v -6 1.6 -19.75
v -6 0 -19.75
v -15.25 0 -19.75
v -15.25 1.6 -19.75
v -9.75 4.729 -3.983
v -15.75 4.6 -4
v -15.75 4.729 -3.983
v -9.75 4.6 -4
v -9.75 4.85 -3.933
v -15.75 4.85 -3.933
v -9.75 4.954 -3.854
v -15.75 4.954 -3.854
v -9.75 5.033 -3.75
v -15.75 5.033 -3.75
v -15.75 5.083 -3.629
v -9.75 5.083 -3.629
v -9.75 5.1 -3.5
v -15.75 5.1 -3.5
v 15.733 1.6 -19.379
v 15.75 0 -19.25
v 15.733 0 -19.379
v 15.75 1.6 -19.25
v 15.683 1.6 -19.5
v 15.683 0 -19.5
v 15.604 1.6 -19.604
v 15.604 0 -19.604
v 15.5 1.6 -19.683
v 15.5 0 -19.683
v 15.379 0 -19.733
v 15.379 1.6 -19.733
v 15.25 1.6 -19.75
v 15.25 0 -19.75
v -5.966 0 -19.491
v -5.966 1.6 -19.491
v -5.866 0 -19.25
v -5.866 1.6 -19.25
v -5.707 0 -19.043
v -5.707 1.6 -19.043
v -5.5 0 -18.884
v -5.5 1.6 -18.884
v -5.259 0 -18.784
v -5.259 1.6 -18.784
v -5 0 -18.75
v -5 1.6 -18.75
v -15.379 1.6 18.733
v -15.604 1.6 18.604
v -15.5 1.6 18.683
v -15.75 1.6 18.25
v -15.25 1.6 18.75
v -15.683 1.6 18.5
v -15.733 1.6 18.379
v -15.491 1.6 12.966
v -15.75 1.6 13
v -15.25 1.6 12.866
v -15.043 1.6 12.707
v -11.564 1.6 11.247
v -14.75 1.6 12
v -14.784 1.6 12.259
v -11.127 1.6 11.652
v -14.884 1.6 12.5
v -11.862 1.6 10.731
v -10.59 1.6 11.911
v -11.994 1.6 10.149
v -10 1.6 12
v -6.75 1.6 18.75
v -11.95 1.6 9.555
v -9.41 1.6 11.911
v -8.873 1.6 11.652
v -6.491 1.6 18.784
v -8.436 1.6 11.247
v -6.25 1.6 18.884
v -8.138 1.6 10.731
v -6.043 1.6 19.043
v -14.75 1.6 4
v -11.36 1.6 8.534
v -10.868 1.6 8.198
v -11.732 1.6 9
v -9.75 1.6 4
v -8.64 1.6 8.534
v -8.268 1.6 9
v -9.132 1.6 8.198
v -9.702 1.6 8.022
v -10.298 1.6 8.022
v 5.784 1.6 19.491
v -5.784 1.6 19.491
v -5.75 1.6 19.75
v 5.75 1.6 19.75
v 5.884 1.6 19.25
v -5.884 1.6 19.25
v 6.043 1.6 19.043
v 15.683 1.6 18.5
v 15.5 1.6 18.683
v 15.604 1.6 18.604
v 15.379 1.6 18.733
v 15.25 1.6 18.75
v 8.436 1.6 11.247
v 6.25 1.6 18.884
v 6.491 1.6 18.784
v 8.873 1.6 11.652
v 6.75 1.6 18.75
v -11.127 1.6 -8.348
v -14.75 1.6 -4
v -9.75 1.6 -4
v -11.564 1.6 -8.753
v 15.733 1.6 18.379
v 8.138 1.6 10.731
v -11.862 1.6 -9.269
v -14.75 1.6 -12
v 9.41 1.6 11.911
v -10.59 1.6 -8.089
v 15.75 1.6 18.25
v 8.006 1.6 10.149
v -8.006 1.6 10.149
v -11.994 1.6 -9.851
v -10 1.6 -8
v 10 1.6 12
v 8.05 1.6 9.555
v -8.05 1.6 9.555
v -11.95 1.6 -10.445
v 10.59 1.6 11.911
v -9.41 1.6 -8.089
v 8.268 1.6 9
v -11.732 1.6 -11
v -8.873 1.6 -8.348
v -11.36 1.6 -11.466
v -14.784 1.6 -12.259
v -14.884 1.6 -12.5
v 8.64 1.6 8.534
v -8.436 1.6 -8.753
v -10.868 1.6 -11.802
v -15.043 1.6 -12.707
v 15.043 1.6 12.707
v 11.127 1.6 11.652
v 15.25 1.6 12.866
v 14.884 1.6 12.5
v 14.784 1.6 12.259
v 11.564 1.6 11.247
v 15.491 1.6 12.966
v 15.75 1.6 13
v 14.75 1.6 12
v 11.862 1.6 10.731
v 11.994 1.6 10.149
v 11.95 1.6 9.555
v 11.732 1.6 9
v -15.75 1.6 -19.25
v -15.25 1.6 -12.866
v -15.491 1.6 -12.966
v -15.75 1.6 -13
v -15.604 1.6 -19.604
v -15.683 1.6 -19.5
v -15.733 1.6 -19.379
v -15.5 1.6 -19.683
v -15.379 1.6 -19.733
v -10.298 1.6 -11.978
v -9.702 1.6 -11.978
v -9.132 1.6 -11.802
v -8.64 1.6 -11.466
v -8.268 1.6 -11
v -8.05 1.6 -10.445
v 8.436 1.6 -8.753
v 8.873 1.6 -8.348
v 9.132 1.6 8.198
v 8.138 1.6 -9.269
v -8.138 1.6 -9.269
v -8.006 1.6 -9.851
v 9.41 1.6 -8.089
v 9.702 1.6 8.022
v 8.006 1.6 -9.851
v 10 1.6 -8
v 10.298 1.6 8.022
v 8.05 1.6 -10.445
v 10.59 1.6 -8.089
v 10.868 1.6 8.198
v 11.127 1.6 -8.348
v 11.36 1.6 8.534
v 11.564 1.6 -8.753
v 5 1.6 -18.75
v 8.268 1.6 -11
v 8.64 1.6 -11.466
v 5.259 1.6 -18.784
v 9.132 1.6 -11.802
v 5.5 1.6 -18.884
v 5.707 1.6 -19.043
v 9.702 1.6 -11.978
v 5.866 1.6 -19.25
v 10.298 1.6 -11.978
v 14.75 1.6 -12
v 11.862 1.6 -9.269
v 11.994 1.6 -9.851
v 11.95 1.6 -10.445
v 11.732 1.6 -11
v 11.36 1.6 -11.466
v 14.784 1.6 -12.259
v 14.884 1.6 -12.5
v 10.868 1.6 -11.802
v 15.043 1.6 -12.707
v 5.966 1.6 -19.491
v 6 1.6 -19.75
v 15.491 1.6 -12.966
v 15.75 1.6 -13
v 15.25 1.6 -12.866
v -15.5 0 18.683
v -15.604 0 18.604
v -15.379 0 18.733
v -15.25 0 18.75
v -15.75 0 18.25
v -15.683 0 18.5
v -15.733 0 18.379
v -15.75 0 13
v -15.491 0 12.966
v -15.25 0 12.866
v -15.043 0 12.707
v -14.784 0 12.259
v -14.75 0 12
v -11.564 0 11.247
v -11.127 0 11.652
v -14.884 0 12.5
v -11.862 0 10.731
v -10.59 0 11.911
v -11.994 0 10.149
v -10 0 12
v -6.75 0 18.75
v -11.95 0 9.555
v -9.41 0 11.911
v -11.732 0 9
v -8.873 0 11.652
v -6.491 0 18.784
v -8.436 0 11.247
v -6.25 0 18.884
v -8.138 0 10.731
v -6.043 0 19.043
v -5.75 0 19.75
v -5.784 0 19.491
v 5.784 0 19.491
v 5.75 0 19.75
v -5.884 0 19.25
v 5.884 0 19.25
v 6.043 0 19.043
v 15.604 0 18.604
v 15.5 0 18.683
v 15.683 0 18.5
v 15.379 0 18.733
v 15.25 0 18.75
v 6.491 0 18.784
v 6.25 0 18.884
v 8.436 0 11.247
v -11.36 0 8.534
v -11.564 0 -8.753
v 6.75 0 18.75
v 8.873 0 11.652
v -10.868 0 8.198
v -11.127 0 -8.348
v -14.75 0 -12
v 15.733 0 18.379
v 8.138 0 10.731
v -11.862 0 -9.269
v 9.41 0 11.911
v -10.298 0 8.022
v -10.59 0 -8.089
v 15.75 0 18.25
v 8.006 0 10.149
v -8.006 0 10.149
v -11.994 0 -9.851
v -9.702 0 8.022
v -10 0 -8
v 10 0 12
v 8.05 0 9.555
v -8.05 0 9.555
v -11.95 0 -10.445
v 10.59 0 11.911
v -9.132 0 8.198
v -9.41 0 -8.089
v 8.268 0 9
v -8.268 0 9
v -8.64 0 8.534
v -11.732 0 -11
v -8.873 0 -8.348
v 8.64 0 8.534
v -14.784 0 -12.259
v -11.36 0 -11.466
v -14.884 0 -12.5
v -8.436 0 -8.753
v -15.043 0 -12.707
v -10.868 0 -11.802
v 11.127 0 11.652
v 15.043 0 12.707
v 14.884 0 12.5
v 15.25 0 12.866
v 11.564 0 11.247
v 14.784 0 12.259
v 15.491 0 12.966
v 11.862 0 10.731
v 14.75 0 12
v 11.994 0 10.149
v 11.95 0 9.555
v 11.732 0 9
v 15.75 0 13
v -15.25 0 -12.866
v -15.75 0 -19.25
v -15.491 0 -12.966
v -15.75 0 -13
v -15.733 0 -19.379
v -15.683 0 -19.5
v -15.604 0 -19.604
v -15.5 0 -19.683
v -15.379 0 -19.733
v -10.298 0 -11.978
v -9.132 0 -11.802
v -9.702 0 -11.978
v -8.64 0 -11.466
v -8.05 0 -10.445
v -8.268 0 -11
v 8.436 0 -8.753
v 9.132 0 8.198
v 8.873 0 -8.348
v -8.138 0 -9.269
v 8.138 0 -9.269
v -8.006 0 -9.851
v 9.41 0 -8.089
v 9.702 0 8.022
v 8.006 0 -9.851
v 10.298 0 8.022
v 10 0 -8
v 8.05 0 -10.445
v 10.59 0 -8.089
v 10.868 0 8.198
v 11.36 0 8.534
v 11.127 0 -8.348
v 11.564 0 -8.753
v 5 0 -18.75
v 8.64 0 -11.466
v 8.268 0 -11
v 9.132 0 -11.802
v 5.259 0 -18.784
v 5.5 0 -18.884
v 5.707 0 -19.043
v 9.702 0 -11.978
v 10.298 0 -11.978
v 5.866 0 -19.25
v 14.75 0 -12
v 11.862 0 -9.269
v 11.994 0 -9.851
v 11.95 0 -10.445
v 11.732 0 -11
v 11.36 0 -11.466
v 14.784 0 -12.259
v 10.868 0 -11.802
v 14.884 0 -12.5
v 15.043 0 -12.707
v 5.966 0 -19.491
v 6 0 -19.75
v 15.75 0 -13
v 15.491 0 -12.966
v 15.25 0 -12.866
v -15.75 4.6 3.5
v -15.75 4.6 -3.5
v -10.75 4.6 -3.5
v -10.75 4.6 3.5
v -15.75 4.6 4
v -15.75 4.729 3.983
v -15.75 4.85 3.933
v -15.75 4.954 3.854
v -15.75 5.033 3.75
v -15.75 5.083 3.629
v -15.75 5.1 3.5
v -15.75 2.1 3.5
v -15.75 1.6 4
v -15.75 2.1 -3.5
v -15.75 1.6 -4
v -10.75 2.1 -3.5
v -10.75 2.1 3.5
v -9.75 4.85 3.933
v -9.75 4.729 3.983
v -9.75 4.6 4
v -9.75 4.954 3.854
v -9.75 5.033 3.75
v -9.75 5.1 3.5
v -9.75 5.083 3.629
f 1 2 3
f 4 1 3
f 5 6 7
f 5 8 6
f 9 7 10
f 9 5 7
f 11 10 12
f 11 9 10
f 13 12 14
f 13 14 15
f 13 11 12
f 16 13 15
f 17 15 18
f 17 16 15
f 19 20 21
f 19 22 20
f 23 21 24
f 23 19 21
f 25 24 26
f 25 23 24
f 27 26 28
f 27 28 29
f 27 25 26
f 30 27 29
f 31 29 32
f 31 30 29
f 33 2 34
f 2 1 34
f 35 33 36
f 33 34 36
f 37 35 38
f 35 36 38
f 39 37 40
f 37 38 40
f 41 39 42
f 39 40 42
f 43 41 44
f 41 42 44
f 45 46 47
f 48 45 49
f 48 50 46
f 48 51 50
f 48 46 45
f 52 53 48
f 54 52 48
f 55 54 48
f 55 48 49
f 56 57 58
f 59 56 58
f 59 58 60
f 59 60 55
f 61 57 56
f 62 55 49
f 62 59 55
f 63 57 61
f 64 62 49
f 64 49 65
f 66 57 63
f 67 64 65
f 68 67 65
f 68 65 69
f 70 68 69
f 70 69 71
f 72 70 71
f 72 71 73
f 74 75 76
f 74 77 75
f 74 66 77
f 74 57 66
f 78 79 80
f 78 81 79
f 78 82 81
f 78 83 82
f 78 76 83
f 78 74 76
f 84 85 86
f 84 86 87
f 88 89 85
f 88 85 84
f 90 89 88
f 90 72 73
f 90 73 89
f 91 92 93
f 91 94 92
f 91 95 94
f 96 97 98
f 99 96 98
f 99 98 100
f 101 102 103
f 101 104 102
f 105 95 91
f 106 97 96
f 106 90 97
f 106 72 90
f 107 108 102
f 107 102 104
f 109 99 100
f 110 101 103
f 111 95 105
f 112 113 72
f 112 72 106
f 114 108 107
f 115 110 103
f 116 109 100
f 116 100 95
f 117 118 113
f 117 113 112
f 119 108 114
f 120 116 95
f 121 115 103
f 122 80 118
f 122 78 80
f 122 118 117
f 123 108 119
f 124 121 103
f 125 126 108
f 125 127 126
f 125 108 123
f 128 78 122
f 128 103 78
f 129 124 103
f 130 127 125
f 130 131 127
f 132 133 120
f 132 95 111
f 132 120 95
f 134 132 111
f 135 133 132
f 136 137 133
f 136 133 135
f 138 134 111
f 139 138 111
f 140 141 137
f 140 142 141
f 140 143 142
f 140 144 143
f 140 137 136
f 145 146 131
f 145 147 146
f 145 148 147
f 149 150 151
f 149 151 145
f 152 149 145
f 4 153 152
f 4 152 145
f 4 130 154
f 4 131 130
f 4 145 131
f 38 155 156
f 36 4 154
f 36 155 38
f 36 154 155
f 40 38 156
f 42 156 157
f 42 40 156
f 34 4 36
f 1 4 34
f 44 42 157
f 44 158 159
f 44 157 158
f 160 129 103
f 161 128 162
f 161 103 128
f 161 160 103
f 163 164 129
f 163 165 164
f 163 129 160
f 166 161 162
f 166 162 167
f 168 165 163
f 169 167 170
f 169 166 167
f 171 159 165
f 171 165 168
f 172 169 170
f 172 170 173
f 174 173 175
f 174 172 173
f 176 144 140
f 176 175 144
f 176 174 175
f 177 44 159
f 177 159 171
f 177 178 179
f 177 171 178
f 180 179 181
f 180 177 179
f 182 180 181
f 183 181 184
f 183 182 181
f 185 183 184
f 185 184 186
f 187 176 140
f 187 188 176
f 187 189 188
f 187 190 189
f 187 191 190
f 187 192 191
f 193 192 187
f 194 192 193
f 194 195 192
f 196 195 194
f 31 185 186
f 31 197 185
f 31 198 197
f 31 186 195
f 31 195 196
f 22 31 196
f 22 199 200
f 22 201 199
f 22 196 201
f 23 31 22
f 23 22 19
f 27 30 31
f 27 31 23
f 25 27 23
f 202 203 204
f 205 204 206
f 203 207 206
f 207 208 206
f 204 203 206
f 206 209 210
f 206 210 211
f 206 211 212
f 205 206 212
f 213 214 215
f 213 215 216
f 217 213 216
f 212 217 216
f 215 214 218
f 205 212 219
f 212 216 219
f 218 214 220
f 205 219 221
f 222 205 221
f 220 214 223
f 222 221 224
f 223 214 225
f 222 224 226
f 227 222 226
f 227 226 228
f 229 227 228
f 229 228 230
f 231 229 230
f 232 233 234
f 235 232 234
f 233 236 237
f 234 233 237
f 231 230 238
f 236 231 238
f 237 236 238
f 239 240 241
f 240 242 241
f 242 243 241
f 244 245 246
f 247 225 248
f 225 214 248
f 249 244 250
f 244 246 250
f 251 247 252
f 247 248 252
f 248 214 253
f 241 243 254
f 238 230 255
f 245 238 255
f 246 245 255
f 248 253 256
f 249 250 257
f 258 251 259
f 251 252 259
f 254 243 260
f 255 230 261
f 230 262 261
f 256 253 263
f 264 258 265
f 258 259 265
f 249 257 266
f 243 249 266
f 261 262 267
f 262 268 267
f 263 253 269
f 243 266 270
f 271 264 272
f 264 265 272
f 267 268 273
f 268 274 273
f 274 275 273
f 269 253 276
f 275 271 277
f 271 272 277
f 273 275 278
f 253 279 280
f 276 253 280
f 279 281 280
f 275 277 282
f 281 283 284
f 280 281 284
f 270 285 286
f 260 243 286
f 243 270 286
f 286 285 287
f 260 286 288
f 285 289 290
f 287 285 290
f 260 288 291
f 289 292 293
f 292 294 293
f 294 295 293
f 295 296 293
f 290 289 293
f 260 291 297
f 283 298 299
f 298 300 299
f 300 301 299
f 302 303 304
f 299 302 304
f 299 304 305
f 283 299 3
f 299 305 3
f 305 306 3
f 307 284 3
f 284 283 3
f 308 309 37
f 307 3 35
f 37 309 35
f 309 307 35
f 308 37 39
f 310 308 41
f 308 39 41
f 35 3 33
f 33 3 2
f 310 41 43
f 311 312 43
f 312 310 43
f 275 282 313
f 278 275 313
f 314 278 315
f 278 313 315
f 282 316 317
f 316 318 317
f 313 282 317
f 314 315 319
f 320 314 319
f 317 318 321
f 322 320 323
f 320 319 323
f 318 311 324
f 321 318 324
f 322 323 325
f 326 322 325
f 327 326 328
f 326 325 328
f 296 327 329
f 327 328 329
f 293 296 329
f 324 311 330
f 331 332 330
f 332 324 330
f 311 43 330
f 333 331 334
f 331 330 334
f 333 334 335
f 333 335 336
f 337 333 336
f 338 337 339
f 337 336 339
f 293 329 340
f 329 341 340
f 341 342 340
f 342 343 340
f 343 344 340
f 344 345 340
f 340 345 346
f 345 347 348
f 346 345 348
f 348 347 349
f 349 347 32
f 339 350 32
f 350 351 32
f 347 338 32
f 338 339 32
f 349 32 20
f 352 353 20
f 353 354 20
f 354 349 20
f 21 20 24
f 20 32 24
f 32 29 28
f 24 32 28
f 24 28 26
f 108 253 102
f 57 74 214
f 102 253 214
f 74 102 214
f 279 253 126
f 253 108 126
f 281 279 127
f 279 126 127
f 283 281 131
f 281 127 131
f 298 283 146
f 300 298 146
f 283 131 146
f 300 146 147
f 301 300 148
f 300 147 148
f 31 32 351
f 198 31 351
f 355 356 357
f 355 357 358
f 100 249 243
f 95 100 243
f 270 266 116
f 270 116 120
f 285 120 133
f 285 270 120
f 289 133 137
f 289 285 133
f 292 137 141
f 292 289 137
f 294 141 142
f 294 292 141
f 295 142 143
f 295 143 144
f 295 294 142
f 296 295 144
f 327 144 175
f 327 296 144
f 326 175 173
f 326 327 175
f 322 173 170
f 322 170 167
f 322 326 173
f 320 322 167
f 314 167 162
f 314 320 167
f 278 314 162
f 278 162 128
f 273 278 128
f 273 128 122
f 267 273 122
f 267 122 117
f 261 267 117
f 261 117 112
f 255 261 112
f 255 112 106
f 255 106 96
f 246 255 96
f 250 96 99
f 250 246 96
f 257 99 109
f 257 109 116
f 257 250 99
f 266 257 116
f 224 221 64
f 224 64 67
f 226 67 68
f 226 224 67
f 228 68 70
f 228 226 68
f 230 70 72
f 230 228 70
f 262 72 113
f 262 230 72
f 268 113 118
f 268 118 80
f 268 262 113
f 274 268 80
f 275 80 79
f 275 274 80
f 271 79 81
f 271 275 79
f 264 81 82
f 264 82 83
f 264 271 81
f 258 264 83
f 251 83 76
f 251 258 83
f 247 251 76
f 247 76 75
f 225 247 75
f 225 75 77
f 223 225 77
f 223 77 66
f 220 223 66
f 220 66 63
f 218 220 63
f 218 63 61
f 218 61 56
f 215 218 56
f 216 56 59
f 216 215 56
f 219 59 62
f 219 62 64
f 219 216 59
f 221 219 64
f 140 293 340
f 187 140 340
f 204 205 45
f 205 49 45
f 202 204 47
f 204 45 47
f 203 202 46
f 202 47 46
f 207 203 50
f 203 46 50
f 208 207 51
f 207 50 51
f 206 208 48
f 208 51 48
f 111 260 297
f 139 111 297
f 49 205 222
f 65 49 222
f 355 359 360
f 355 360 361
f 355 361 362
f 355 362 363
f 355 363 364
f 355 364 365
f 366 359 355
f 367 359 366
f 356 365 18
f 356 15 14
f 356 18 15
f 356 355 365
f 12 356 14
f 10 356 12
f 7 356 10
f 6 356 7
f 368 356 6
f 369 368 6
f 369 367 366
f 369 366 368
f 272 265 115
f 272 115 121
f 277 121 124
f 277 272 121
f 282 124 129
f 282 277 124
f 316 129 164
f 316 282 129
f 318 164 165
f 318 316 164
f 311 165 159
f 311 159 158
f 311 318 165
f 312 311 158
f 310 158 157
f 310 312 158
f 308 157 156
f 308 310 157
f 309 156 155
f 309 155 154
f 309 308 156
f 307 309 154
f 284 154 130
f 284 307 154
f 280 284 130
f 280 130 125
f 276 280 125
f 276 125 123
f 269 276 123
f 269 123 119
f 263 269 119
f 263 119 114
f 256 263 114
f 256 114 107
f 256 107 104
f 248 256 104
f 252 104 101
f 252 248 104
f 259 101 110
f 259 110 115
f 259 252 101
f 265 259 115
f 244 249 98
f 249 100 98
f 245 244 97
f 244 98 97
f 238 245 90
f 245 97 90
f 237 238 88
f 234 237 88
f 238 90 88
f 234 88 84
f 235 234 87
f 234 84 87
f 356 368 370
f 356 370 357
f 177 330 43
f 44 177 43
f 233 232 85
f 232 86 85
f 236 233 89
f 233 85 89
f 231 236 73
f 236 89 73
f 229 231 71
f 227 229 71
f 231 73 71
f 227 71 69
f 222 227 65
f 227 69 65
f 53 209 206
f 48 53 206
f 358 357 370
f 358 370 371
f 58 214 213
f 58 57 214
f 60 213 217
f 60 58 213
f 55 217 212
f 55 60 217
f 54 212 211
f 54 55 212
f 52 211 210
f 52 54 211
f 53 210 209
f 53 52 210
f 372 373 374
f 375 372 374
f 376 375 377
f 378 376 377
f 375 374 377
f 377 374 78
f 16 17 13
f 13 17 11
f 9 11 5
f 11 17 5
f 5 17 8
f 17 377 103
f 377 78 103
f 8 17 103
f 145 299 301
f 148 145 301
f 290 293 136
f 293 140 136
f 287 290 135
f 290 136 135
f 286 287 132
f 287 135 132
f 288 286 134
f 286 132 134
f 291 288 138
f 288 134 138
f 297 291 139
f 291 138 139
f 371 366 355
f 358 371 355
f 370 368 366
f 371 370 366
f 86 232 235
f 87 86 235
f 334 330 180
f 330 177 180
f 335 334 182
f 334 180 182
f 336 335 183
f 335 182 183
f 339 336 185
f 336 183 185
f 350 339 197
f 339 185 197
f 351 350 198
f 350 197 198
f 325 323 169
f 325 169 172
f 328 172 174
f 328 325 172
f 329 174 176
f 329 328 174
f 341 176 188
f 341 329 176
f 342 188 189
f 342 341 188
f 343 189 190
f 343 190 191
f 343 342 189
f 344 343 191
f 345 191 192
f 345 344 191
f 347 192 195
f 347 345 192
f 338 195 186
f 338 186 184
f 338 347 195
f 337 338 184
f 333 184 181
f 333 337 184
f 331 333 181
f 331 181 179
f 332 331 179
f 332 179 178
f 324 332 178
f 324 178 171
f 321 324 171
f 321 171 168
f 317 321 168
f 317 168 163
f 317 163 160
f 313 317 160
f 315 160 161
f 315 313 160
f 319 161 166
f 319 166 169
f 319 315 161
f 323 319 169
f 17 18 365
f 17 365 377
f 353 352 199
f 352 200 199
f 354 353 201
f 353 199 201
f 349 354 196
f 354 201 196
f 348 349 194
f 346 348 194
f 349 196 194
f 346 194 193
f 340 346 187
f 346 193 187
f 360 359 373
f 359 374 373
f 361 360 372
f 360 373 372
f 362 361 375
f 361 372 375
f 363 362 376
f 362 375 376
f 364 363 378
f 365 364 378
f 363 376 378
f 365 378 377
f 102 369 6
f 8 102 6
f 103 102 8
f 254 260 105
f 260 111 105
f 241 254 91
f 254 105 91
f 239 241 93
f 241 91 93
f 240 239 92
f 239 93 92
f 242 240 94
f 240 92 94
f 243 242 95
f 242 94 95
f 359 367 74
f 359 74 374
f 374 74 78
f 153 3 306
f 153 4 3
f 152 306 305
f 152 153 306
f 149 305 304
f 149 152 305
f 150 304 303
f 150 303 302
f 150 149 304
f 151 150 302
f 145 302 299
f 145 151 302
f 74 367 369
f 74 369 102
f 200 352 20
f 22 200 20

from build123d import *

# Parameters (mm, degrees)
SKETCH1_R           = 2
BOSS_EXTRUDE1_DEPTH = 1.6
SKETCH2_W           = 6
SKETCH2_H           = 8
BOSS_EXTRUDE2_DEPTH = 3.5
FILLET1_R           = 1
FILLET2_R           = 0.5
SKETCH3_W           = 7
SKETCH3_H           = 2.5
CUT_EXTRUDE1_DEPTH  = 5


with BuildPart() as part:
    # Sketch1 → Boss-Extrude1 (new body)
    with BuildSketch(Plane(origin=(0, 0, 0), x_dir=(1, 0, 0), z_dir=(0, 1, 0))):
        Polygon((15.75, 13), (15.75, 19.75), (6, 19.75), (6, 18.75), (-6, 18.75), (-6, 19.75), (-15.75, 19.75), (-15.75, 13), (-14.75, 13), (-14.75, -13), (-15.75, -13), (-15.75, -18.75), (-5.75, -18.75), (-5.75, -19.75), (5.75, -19.75), (5.75, -18.75), (15.75, -18.75), (15.75, -13), (14.75, -13), (14.75, 13), align=None)
        with Locations(Location((10, -10, 0), (0, 0, 270))):
            Circle(SKETCH1_R, mode=Mode.SUBTRACT)
        with Locations(Location((10, 10, 0), (0, 0, 270))):
            Circle(SKETCH1_R, mode=Mode.SUBTRACT)
        with Locations(Location((-10, 10, 0), (0, 0, 270))):
            Circle(SKETCH1_R, mode=Mode.SUBTRACT)
        with Locations(Location((-10, -10, 0), (0, 0, 270))):
            Circle(SKETCH1_R, mode=Mode.SUBTRACT)
    extrude(amount=BOSS_EXTRUDE1_DEPTH)

    # Sketch2 → Boss-Extrude2 (add)
    with BuildSketch(Plane(origin=(0, 1.6, 0), x_dir=(1, 0, 0), z_dir=(0, 1, 0))):
        with Locations((-12.75, 0)):
            Rectangle(SKETCH2_W, SKETCH2_H)
    extrude(amount=BOSS_EXTRUDE2_DEPTH)

    # Fillet1
    fillet1_edges = [part.edges().sort_by_distance(p)[0] for p in [
        (14.75, 0.8, -13),
        (14.75, 0.8, 13),
        (-6, 0.8, -18.75),
        (6, 0.8, -18.75),
        (-14.75, 0.8, -13),
        (-14.75, 0.8, 13),
        (-5.75, 0.8, 18.75),
        (5.75, 0.8, 18.75),
    ]]
    fillet(fillet1_edges, radius=FILLET1_R - 0.0001)  # a hair under: the kernel refuses the full size

    # Fillet2
    fillet2_edges = [part.edges().sort_by_distance(p)[0] for p in [
        (-15.75, 0.8, 18.75),
        (-15.75, 0.8, -19.75),
        (15.75, 0.8, -19.75),
        (15.75, 0.8, 18.75),
        (-12.75, 5.1, -4),
        (-12.75, 5.1, 4),
    ]]
    fillet(fillet2_edges, radius=FILLET2_R)

    # Sketch3 → Cut-Extrude1 (cut)
    with BuildSketch(Plane.ZY.offset(15.75)):
        with Locations((0, 3.35)):
            Rectangle(SKETCH3_W, SKETCH3_H)
    extrude(amount=-CUT_EXTRUDE1_DEPTH, mode=Mode.SUBTRACT)


solid = part.part
